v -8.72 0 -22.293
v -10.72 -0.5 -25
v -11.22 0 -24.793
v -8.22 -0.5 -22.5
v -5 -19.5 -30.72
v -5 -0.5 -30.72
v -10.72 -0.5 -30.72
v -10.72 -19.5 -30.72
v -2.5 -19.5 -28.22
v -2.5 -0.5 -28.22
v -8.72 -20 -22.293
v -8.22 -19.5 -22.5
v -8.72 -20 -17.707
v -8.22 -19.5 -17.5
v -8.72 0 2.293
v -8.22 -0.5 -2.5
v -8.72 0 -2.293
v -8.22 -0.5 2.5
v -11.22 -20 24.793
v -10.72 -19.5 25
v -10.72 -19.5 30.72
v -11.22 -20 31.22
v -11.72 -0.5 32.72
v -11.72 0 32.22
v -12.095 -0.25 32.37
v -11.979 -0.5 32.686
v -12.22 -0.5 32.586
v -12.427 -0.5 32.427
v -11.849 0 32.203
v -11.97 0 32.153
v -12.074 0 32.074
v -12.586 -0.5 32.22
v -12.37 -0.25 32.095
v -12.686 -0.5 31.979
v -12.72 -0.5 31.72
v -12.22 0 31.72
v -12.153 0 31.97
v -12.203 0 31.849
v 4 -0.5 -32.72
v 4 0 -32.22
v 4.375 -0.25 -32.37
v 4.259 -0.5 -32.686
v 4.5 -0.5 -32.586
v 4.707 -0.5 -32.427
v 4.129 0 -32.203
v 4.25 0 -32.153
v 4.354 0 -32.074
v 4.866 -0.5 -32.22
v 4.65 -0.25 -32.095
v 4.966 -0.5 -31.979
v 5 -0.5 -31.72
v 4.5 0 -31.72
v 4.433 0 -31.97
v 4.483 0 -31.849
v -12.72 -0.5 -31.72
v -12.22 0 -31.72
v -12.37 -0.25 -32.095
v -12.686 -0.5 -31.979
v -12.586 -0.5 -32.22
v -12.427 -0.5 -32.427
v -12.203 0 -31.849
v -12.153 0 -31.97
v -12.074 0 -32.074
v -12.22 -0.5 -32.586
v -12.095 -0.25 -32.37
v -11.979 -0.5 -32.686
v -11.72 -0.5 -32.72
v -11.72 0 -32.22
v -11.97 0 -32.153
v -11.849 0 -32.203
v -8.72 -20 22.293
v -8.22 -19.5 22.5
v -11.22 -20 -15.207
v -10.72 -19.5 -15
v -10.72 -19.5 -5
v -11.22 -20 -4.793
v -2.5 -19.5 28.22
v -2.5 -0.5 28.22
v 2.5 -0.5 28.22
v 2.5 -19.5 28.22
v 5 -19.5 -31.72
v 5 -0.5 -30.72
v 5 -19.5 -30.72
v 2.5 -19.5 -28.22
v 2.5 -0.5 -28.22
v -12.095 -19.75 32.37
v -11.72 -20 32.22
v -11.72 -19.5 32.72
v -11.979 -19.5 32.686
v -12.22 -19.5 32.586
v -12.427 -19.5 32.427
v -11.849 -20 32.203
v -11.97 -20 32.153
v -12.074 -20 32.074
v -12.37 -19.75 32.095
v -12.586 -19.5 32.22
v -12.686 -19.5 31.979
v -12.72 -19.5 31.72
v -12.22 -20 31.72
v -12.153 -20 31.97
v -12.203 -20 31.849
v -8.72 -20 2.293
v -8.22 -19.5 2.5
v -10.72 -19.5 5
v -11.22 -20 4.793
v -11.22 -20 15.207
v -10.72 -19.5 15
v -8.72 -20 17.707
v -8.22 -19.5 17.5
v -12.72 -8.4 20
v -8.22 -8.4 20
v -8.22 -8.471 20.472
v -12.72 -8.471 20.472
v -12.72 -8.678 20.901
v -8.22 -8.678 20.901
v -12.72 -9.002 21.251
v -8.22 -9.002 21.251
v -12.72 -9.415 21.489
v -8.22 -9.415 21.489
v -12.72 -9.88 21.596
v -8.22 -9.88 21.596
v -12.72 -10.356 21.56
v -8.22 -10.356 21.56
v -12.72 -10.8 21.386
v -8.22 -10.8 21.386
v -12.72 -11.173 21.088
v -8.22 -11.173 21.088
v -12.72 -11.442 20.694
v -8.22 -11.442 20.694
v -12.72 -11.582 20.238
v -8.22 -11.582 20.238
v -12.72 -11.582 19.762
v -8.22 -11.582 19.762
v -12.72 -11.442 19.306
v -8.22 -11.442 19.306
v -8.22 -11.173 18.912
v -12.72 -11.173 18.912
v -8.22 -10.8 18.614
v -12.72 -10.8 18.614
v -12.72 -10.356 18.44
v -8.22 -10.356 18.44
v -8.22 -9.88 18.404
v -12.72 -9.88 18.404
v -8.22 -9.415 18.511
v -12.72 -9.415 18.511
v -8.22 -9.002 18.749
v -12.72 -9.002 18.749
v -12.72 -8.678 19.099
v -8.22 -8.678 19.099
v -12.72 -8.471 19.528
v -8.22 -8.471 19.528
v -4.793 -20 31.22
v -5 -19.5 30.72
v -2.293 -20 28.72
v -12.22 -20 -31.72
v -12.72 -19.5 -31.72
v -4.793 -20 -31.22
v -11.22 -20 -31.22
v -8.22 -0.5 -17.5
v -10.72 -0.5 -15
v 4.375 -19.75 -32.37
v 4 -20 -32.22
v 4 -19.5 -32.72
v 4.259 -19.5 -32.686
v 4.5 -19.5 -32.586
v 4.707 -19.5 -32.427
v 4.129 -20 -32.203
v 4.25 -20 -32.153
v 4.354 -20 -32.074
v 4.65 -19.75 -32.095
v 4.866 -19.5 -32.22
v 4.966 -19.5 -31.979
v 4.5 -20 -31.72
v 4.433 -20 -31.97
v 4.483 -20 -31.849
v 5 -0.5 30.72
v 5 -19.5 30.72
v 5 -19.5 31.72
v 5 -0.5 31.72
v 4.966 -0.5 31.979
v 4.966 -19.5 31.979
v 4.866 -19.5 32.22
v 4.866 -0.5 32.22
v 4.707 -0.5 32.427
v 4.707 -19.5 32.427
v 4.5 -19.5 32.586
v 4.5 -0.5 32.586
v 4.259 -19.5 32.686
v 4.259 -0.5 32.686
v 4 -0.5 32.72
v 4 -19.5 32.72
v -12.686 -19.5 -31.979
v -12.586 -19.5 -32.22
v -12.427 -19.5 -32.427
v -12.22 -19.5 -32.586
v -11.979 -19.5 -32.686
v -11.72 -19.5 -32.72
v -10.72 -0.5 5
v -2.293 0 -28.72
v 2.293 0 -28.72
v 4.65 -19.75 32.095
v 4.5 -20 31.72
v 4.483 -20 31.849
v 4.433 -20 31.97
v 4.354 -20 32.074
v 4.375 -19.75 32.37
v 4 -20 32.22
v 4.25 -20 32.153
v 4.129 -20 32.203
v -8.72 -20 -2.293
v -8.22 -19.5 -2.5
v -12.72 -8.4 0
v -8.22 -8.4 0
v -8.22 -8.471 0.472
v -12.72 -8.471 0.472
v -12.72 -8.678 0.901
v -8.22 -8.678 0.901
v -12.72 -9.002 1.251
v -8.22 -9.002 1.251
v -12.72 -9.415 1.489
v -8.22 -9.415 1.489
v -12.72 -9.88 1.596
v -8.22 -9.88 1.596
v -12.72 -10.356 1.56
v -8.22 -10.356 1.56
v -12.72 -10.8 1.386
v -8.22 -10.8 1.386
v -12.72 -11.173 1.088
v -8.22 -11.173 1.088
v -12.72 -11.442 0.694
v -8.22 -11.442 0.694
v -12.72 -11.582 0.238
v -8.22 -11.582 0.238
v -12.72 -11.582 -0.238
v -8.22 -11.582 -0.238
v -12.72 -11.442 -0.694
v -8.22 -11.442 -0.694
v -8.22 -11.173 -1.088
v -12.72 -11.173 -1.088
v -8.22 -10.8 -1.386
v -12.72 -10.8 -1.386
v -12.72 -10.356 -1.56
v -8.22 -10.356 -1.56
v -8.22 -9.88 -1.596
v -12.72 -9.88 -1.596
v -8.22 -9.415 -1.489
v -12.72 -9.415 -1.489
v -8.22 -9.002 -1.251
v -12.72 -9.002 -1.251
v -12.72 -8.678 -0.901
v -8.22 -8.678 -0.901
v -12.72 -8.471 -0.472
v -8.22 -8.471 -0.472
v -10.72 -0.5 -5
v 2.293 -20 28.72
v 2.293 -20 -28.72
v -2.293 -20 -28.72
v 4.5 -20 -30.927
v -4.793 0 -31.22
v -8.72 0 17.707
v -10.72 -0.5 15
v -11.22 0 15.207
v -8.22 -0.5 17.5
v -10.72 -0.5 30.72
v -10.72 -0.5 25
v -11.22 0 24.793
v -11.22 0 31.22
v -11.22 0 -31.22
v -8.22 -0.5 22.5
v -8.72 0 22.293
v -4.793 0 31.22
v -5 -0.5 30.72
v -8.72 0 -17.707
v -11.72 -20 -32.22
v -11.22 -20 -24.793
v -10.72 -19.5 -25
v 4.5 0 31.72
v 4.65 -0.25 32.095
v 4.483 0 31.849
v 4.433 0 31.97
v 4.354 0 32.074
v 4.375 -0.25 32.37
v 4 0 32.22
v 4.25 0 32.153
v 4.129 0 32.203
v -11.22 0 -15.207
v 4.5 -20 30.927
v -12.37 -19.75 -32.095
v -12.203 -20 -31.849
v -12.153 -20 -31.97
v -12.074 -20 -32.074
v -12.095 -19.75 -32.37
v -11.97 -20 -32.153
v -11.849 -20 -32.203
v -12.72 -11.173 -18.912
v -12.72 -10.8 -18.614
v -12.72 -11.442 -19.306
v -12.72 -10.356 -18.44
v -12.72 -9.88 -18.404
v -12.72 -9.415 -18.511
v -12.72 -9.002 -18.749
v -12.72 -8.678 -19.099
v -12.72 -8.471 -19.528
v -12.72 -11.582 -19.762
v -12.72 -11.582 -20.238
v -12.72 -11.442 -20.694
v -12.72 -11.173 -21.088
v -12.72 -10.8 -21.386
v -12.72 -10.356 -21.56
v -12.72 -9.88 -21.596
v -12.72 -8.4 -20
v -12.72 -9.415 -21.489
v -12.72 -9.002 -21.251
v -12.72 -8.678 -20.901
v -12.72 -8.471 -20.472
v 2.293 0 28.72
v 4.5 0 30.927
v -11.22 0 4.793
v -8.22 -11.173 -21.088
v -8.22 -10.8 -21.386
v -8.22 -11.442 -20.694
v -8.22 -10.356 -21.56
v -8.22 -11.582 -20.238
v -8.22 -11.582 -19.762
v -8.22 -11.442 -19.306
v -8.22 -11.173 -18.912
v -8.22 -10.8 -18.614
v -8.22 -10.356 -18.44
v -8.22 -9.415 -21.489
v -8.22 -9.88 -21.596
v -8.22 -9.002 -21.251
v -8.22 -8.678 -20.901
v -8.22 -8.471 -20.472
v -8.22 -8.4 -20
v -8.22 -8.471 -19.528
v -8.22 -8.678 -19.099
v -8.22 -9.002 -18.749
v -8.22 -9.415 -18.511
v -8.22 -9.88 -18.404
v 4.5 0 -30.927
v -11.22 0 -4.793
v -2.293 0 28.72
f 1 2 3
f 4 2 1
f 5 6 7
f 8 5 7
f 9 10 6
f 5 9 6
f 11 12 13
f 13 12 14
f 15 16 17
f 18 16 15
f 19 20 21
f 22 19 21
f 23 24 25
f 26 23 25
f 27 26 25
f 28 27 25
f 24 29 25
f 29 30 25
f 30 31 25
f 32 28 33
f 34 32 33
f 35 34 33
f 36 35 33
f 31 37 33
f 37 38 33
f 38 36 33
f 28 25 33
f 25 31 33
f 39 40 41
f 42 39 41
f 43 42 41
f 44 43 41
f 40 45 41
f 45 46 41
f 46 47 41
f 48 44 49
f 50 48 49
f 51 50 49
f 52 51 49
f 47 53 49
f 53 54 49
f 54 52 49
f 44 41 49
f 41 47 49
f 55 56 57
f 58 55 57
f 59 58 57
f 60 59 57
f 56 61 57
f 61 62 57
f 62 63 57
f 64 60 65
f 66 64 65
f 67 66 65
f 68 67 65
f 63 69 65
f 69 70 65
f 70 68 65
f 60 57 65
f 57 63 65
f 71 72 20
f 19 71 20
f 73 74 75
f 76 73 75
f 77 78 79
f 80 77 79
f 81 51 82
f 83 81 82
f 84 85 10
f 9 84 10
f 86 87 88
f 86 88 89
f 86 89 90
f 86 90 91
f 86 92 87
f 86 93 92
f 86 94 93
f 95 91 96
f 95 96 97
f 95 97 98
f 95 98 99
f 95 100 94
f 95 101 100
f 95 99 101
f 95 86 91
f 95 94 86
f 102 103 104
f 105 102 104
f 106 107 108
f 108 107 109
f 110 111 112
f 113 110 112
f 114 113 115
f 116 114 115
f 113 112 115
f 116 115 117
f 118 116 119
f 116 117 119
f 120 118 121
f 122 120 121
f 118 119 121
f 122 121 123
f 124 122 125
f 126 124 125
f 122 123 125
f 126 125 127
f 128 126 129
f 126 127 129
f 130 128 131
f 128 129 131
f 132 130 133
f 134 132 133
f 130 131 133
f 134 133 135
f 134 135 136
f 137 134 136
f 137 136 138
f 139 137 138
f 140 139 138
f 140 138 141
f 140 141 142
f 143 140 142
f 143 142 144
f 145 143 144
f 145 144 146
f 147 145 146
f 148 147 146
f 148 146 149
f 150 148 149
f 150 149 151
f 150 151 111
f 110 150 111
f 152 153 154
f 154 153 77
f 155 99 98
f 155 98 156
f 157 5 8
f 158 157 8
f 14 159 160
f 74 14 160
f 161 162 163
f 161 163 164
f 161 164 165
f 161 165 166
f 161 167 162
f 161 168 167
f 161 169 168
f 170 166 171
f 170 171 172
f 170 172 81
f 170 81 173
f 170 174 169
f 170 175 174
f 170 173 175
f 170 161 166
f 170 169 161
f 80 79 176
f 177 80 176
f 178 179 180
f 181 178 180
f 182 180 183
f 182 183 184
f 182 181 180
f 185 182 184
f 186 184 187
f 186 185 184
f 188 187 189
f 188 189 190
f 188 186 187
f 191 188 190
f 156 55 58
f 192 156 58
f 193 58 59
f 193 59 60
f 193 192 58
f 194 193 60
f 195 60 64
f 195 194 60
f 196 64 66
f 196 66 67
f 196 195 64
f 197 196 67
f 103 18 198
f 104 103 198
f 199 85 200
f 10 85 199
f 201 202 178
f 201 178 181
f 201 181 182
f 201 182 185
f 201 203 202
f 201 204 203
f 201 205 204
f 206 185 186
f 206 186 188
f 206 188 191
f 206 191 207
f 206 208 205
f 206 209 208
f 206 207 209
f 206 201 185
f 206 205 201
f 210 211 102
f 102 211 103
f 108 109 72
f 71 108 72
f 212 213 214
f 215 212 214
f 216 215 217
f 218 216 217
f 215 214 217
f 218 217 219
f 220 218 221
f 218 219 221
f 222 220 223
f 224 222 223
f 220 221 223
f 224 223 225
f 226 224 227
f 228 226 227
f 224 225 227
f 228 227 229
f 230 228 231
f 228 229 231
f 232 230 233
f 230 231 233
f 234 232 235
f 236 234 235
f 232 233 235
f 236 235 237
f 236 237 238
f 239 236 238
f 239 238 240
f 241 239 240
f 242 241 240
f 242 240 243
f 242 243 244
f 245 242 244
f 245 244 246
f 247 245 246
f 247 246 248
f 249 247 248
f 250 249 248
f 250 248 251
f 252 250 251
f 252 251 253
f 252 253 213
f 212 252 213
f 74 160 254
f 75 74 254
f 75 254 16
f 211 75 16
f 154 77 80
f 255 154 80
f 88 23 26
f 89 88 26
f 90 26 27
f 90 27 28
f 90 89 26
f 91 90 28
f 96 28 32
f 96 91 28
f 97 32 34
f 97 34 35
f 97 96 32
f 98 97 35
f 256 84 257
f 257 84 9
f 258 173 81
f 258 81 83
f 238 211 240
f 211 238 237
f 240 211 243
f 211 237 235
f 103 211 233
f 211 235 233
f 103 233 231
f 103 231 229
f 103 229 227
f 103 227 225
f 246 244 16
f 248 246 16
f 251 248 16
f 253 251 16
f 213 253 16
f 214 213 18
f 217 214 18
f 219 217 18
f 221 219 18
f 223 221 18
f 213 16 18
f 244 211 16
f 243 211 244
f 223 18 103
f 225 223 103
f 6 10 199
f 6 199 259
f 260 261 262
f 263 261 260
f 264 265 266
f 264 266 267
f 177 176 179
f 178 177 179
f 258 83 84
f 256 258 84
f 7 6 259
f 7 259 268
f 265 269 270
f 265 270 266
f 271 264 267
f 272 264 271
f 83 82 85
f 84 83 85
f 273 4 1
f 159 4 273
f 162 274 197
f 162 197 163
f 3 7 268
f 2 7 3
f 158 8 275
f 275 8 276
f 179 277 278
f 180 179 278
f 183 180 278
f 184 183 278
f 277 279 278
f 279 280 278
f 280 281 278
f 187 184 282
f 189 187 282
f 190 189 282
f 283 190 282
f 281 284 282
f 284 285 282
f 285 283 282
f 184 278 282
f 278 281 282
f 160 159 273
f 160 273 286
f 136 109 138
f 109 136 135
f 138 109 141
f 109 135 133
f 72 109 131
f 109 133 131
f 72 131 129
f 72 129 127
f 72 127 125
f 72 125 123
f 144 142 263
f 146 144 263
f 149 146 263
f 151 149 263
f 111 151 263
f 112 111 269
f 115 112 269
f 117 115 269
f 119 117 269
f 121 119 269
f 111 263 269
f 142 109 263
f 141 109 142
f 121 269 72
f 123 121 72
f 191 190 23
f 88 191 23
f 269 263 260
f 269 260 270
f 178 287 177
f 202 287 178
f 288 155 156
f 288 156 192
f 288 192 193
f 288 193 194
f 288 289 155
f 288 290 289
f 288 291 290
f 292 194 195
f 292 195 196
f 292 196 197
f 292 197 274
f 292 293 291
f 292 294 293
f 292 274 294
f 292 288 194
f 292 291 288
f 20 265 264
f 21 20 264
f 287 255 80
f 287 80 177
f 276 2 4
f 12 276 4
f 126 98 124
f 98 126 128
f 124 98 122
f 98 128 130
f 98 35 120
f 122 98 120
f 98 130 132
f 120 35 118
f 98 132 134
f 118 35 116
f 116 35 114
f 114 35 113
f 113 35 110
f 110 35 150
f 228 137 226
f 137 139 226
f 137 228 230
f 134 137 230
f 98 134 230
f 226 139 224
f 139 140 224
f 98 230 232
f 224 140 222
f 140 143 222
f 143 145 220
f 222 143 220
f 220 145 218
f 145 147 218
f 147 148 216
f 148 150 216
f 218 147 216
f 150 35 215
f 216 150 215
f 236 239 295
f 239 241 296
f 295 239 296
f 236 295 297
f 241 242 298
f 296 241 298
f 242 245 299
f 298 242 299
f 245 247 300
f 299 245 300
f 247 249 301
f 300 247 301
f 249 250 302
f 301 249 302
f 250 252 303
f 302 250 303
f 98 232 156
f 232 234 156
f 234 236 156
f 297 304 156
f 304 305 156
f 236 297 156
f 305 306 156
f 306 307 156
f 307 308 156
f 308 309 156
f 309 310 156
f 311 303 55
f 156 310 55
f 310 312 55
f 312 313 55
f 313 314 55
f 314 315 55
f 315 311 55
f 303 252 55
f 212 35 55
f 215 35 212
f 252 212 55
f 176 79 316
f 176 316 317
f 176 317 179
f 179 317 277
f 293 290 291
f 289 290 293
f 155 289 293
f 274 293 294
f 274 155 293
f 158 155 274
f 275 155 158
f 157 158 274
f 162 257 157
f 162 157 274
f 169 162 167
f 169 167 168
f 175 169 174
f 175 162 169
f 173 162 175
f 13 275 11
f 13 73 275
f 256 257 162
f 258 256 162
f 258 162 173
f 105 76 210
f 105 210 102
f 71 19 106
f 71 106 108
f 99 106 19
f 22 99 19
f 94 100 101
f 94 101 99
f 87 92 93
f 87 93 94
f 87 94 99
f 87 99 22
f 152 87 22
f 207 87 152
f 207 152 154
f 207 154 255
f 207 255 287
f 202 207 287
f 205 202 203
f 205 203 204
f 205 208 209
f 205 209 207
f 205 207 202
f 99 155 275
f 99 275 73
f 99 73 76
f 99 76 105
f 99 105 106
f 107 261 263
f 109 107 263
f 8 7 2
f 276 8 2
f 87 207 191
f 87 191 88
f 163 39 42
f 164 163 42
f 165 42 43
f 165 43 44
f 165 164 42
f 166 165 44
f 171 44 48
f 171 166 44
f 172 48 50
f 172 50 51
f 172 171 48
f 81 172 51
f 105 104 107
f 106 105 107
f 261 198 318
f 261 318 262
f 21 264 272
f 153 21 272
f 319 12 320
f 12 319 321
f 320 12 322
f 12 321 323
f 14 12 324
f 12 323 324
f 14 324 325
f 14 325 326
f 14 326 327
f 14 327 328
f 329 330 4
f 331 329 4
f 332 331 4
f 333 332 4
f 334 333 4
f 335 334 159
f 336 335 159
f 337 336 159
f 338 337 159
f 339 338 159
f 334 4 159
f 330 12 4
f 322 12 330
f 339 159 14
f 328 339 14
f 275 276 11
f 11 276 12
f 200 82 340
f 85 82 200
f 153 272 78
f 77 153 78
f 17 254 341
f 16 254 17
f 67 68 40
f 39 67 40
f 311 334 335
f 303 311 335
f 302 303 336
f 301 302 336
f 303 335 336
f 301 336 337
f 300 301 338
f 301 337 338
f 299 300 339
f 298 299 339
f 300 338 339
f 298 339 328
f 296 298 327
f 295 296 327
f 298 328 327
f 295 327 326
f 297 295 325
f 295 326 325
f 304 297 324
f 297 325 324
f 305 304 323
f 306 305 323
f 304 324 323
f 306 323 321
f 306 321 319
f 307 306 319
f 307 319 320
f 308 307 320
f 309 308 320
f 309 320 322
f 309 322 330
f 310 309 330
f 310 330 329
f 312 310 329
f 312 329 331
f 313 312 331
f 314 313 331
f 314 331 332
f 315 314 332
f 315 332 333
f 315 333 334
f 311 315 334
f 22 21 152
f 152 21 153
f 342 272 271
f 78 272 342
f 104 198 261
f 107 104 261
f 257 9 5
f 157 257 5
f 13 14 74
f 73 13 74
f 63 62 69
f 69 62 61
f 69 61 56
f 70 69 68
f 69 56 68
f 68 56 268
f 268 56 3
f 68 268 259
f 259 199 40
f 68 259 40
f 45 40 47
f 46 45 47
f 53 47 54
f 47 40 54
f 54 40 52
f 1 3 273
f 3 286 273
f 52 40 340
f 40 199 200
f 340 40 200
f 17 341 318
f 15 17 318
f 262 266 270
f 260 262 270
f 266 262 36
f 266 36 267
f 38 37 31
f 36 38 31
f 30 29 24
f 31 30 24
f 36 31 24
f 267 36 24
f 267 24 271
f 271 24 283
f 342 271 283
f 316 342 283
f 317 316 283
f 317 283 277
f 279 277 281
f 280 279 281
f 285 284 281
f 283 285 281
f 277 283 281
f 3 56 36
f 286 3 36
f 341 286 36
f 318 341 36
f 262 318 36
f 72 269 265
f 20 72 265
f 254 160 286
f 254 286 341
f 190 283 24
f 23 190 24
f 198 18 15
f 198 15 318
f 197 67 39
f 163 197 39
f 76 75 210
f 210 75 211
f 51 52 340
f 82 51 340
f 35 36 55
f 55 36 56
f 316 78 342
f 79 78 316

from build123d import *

# Parameters (mm, degrees)
F1_DEPTH = 20
F2_R     = 1
F4_D     = 3.2
F5_SIZE  = 0.5


with BuildPart() as f1:
    # F0 (on Front) → F1 (new body)
    with BuildSketch(Plane.XZ):
        Polygon((-10.72, 30.72), (-5, 30.72), (-2.5, 28.22), (2.5, 28.22), (5, 30.72), (5, 32.72), (-12.72, 32.72), (-12.72, -32.72), (5, -32.72), (5, -30.72), (2.5, -28.22), (-2.5, -28.22), (-5, -30.72), (-10.72, -30.72), (-10.72, -25), (-8.22, -22.5), (-8.22, -17.5), (-10.72, -15), (-10.72, -5), (-8.22, -2.5), (-8.22, 2.5), (-10.72, 5), (-10.72, 15), (-8.22, 17.5), (-8.22, 22.5), (-10.72, 25), align=None)
    extrude(amount=F1_DEPTH)

    # F2
    f2_edges = [f1.edges().sort_by_distance(p)[0] for p in [
        (5, -10, 32.72),
        (-12.72, -10, 32.72),
        (-12.72, -10, -32.72),
        (5, -10, -32.72),
    ]]
    fillet(f2_edges, radius=F2_R)

    # F4 (through all)
    with Locations(Plane(origin=(-12.72, 0, 0), x_dir=(0, -1, 0), z_dir=(-1, 0, 0))):
        with Locations((10, 20), (10, 0), (10, -20)):
            Hole(F4_D / 2)

    # F5
    f5_edges = [f1.edges().sort_by_distance(p)[0] for p in [
        (5, -20, 31.22),
        (4.707107, -20, 32.427107),
        (3.75, -20, 29.47),
        (-3.86, -20, 32.72),
        (0, -20, 28.22),
        (-12.427107, -20, 32.427107),
        (-3.75, -20, 29.47),
        (-12.72, -20, 0),
        (-7.86, -20, 30.72),
        (-12.427107, -20, -32.427107),
        (-10.72, -20, 27.86),
        (-3.86, -20, -32.72),
        (-9.47, -20, 23.75),
        (4.707107, -20, -32.427107),
        (-8.22, -20, 20),
        (5, -20, -31.22),
        (-9.47, -20, 16.25),
        (3.75, -20, -29.47),
        (-10.72, -20, 10),
        (0, -20, -28.22),
        (-9.47, -20, 3.75),
        (-3.75, -20, -29.47),
        (-8.22, -20, 0),
        (-7.86, -20, -30.72),
        (-9.47, -20, -3.75),
        (-10.72, -20, -27.86),
        (-10.72, -20, -10),
        (-9.47, -20, -23.75),
        (-9.47, -20, -16.25),
        (-8.22, -20, -20),
        (5, 0, 31.22),
        (4.707107, 0, 32.427107),
        (3.75, 0, 29.47),
        (-3.86, 0, 32.72),
        (0, 0, 28.22),
        (-12.427107, 0, 32.427107),
        (-3.75, 0, 29.47),
        (-12.72, 0, 0),
        (-7.86, 0, 30.72),
        (-12.427107, 0, -32.427107),
        (-10.72, 0, 27.86),
        (-3.86, 0, -32.72),
        (-9.47, 0, 23.75),
        (4.707107, 0, -32.427107),
        (-8.22, 0, 20),
        (5, 0, -31.22),
        (-9.47, 0, 16.25),
        (3.75, 0, -29.47),
        (-10.72, 0, 10),
        (0, 0, -28.22),
        (-9.47, 0, 3.75),
        (-3.75, 0, -29.47),
        (-8.22, 0, 0),
        (-7.86, 0, -30.72),
        (-9.47, 0, -3.75),
        (-10.72, 0, -27.86),
        (-10.72, 0, -10),
        (-9.47, 0, -23.75),
        (-9.47, 0, -16.25),
        (-8.22, 0, -20),
    ]]
    chamfer(f5_edges, length=F5_SIZE)


solid = f1.part
